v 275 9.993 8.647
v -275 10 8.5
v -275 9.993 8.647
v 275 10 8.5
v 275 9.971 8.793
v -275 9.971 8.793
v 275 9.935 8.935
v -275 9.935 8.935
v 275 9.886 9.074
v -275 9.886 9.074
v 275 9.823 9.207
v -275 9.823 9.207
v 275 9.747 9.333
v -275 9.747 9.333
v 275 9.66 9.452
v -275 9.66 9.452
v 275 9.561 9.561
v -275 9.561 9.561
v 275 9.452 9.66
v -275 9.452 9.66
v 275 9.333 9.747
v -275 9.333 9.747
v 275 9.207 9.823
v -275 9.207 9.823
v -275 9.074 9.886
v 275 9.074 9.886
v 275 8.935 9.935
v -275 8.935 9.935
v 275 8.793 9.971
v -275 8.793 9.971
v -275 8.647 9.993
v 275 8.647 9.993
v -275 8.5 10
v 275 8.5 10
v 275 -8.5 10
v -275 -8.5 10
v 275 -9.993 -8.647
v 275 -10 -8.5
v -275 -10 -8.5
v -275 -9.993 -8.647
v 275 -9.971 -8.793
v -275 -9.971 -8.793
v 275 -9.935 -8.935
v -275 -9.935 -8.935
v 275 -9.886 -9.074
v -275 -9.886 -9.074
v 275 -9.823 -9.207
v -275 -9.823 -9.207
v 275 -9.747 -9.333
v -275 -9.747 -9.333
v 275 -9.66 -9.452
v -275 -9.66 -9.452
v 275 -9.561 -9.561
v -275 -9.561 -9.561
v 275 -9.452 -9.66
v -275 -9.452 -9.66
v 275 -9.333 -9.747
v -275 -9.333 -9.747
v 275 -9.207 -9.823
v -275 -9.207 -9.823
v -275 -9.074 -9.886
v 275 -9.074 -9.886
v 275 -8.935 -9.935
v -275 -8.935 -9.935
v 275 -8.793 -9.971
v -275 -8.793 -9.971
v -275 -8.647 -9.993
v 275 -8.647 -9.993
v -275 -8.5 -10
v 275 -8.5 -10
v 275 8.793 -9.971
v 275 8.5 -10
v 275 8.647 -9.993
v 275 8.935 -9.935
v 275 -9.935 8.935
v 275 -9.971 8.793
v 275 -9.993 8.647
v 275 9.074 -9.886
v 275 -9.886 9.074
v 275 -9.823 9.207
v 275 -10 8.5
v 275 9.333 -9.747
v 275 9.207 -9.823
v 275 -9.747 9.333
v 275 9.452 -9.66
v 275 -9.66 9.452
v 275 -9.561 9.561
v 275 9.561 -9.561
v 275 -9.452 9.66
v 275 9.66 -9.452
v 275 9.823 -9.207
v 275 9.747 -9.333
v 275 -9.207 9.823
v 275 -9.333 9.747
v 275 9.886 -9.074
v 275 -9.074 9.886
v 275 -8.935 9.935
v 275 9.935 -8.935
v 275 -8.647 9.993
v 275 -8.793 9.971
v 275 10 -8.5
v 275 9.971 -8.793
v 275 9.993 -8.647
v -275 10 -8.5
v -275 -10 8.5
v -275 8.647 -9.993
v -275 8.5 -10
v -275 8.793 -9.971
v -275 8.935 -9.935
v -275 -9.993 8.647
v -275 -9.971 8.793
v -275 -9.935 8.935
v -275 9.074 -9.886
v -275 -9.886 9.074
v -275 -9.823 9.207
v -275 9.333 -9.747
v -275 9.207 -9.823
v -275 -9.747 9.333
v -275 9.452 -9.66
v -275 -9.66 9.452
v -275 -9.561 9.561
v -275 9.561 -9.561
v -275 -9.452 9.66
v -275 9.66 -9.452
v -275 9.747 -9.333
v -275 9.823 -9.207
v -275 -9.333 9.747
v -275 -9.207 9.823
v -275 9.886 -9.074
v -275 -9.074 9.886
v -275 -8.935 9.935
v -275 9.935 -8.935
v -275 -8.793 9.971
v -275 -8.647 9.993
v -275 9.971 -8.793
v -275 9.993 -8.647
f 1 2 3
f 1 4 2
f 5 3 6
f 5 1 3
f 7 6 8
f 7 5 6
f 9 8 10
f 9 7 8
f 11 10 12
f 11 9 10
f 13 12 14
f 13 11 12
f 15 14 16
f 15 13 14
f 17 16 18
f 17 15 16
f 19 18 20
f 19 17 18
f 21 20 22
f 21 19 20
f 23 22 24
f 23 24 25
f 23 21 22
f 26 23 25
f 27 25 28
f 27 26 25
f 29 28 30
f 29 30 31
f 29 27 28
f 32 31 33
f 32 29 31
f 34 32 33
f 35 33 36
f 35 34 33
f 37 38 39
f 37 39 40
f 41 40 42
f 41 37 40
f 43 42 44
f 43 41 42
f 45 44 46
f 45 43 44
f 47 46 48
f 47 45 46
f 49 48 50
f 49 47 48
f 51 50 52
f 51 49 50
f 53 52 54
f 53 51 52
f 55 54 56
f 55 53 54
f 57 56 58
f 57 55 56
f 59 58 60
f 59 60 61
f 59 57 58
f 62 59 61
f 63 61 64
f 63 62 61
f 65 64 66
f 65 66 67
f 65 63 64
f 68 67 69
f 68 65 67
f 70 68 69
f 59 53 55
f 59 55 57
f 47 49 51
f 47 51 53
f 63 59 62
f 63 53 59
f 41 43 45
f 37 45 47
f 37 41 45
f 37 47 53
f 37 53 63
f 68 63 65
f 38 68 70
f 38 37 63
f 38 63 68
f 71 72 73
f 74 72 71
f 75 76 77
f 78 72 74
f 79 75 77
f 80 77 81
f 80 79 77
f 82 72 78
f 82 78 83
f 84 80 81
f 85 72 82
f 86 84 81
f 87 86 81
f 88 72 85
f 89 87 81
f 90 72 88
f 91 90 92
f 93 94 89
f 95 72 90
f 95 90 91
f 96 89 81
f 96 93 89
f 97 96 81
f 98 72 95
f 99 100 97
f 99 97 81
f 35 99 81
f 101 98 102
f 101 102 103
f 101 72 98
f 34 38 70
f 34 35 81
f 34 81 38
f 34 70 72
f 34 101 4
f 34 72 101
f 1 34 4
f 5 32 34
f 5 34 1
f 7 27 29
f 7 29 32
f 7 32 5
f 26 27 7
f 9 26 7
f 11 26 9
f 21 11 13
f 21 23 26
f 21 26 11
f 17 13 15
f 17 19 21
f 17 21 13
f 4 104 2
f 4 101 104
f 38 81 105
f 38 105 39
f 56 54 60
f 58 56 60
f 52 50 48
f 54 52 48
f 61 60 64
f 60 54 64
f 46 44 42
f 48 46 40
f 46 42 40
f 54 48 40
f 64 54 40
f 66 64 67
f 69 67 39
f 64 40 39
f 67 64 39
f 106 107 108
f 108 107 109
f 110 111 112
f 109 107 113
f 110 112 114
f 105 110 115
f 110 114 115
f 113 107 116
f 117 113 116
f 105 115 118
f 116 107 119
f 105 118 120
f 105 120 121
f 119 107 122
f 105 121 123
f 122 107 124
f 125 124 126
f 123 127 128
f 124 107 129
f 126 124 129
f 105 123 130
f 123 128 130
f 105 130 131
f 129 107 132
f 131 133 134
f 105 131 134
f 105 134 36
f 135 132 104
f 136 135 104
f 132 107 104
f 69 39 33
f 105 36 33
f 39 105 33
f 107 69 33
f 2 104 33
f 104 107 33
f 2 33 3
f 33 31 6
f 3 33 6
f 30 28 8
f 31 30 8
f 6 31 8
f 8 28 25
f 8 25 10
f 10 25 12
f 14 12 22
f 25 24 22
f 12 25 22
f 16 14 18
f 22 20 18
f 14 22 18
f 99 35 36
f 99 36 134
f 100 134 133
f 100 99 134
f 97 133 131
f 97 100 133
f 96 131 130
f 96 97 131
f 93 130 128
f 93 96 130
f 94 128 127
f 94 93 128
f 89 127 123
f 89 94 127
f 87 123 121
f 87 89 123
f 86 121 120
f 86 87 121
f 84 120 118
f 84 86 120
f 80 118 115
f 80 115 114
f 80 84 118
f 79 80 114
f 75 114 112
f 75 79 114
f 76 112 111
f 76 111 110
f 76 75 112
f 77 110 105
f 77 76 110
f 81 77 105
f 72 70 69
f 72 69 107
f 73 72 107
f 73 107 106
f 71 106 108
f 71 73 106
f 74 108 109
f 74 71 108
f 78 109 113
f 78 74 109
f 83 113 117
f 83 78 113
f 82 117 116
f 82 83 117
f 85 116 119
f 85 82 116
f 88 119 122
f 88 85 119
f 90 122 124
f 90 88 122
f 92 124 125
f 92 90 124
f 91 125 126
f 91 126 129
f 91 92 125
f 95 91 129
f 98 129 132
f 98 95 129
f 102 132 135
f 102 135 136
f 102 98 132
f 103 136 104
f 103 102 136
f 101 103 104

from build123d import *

# Parameters (mm, degrees)
F1_DEPTH = 275


with BuildPart() as f1:
    # F0 (on Right) → F1 (new body, symmetric)
    with BuildSketch(Plane.YZ):
        with BuildLine():
            Line((8.5, 10), (-8.5, 10))
            ThreePointArc((-8.5, 10), (-9.56066, 9.56066), (-10, 8.5))
            Line((-10, 8.5), (-10, -8.5))
            ThreePointArc((-10, -8.5), (-9.56066, -9.56066), (-8.5, -10))
            Line((-8.5, -10), (8.5, -10))
            ThreePointArc((8.5, -10), (9.56066, -9.56066), (10, -8.5))
            Line((10, -8.5), (10, 8.5))
            ThreePointArc((10, 8.5), (9.56066, 9.56066), (8.5, 10))
        make_face()
    extrude(amount=F1_DEPTH, both=True)


solid = f1.part
